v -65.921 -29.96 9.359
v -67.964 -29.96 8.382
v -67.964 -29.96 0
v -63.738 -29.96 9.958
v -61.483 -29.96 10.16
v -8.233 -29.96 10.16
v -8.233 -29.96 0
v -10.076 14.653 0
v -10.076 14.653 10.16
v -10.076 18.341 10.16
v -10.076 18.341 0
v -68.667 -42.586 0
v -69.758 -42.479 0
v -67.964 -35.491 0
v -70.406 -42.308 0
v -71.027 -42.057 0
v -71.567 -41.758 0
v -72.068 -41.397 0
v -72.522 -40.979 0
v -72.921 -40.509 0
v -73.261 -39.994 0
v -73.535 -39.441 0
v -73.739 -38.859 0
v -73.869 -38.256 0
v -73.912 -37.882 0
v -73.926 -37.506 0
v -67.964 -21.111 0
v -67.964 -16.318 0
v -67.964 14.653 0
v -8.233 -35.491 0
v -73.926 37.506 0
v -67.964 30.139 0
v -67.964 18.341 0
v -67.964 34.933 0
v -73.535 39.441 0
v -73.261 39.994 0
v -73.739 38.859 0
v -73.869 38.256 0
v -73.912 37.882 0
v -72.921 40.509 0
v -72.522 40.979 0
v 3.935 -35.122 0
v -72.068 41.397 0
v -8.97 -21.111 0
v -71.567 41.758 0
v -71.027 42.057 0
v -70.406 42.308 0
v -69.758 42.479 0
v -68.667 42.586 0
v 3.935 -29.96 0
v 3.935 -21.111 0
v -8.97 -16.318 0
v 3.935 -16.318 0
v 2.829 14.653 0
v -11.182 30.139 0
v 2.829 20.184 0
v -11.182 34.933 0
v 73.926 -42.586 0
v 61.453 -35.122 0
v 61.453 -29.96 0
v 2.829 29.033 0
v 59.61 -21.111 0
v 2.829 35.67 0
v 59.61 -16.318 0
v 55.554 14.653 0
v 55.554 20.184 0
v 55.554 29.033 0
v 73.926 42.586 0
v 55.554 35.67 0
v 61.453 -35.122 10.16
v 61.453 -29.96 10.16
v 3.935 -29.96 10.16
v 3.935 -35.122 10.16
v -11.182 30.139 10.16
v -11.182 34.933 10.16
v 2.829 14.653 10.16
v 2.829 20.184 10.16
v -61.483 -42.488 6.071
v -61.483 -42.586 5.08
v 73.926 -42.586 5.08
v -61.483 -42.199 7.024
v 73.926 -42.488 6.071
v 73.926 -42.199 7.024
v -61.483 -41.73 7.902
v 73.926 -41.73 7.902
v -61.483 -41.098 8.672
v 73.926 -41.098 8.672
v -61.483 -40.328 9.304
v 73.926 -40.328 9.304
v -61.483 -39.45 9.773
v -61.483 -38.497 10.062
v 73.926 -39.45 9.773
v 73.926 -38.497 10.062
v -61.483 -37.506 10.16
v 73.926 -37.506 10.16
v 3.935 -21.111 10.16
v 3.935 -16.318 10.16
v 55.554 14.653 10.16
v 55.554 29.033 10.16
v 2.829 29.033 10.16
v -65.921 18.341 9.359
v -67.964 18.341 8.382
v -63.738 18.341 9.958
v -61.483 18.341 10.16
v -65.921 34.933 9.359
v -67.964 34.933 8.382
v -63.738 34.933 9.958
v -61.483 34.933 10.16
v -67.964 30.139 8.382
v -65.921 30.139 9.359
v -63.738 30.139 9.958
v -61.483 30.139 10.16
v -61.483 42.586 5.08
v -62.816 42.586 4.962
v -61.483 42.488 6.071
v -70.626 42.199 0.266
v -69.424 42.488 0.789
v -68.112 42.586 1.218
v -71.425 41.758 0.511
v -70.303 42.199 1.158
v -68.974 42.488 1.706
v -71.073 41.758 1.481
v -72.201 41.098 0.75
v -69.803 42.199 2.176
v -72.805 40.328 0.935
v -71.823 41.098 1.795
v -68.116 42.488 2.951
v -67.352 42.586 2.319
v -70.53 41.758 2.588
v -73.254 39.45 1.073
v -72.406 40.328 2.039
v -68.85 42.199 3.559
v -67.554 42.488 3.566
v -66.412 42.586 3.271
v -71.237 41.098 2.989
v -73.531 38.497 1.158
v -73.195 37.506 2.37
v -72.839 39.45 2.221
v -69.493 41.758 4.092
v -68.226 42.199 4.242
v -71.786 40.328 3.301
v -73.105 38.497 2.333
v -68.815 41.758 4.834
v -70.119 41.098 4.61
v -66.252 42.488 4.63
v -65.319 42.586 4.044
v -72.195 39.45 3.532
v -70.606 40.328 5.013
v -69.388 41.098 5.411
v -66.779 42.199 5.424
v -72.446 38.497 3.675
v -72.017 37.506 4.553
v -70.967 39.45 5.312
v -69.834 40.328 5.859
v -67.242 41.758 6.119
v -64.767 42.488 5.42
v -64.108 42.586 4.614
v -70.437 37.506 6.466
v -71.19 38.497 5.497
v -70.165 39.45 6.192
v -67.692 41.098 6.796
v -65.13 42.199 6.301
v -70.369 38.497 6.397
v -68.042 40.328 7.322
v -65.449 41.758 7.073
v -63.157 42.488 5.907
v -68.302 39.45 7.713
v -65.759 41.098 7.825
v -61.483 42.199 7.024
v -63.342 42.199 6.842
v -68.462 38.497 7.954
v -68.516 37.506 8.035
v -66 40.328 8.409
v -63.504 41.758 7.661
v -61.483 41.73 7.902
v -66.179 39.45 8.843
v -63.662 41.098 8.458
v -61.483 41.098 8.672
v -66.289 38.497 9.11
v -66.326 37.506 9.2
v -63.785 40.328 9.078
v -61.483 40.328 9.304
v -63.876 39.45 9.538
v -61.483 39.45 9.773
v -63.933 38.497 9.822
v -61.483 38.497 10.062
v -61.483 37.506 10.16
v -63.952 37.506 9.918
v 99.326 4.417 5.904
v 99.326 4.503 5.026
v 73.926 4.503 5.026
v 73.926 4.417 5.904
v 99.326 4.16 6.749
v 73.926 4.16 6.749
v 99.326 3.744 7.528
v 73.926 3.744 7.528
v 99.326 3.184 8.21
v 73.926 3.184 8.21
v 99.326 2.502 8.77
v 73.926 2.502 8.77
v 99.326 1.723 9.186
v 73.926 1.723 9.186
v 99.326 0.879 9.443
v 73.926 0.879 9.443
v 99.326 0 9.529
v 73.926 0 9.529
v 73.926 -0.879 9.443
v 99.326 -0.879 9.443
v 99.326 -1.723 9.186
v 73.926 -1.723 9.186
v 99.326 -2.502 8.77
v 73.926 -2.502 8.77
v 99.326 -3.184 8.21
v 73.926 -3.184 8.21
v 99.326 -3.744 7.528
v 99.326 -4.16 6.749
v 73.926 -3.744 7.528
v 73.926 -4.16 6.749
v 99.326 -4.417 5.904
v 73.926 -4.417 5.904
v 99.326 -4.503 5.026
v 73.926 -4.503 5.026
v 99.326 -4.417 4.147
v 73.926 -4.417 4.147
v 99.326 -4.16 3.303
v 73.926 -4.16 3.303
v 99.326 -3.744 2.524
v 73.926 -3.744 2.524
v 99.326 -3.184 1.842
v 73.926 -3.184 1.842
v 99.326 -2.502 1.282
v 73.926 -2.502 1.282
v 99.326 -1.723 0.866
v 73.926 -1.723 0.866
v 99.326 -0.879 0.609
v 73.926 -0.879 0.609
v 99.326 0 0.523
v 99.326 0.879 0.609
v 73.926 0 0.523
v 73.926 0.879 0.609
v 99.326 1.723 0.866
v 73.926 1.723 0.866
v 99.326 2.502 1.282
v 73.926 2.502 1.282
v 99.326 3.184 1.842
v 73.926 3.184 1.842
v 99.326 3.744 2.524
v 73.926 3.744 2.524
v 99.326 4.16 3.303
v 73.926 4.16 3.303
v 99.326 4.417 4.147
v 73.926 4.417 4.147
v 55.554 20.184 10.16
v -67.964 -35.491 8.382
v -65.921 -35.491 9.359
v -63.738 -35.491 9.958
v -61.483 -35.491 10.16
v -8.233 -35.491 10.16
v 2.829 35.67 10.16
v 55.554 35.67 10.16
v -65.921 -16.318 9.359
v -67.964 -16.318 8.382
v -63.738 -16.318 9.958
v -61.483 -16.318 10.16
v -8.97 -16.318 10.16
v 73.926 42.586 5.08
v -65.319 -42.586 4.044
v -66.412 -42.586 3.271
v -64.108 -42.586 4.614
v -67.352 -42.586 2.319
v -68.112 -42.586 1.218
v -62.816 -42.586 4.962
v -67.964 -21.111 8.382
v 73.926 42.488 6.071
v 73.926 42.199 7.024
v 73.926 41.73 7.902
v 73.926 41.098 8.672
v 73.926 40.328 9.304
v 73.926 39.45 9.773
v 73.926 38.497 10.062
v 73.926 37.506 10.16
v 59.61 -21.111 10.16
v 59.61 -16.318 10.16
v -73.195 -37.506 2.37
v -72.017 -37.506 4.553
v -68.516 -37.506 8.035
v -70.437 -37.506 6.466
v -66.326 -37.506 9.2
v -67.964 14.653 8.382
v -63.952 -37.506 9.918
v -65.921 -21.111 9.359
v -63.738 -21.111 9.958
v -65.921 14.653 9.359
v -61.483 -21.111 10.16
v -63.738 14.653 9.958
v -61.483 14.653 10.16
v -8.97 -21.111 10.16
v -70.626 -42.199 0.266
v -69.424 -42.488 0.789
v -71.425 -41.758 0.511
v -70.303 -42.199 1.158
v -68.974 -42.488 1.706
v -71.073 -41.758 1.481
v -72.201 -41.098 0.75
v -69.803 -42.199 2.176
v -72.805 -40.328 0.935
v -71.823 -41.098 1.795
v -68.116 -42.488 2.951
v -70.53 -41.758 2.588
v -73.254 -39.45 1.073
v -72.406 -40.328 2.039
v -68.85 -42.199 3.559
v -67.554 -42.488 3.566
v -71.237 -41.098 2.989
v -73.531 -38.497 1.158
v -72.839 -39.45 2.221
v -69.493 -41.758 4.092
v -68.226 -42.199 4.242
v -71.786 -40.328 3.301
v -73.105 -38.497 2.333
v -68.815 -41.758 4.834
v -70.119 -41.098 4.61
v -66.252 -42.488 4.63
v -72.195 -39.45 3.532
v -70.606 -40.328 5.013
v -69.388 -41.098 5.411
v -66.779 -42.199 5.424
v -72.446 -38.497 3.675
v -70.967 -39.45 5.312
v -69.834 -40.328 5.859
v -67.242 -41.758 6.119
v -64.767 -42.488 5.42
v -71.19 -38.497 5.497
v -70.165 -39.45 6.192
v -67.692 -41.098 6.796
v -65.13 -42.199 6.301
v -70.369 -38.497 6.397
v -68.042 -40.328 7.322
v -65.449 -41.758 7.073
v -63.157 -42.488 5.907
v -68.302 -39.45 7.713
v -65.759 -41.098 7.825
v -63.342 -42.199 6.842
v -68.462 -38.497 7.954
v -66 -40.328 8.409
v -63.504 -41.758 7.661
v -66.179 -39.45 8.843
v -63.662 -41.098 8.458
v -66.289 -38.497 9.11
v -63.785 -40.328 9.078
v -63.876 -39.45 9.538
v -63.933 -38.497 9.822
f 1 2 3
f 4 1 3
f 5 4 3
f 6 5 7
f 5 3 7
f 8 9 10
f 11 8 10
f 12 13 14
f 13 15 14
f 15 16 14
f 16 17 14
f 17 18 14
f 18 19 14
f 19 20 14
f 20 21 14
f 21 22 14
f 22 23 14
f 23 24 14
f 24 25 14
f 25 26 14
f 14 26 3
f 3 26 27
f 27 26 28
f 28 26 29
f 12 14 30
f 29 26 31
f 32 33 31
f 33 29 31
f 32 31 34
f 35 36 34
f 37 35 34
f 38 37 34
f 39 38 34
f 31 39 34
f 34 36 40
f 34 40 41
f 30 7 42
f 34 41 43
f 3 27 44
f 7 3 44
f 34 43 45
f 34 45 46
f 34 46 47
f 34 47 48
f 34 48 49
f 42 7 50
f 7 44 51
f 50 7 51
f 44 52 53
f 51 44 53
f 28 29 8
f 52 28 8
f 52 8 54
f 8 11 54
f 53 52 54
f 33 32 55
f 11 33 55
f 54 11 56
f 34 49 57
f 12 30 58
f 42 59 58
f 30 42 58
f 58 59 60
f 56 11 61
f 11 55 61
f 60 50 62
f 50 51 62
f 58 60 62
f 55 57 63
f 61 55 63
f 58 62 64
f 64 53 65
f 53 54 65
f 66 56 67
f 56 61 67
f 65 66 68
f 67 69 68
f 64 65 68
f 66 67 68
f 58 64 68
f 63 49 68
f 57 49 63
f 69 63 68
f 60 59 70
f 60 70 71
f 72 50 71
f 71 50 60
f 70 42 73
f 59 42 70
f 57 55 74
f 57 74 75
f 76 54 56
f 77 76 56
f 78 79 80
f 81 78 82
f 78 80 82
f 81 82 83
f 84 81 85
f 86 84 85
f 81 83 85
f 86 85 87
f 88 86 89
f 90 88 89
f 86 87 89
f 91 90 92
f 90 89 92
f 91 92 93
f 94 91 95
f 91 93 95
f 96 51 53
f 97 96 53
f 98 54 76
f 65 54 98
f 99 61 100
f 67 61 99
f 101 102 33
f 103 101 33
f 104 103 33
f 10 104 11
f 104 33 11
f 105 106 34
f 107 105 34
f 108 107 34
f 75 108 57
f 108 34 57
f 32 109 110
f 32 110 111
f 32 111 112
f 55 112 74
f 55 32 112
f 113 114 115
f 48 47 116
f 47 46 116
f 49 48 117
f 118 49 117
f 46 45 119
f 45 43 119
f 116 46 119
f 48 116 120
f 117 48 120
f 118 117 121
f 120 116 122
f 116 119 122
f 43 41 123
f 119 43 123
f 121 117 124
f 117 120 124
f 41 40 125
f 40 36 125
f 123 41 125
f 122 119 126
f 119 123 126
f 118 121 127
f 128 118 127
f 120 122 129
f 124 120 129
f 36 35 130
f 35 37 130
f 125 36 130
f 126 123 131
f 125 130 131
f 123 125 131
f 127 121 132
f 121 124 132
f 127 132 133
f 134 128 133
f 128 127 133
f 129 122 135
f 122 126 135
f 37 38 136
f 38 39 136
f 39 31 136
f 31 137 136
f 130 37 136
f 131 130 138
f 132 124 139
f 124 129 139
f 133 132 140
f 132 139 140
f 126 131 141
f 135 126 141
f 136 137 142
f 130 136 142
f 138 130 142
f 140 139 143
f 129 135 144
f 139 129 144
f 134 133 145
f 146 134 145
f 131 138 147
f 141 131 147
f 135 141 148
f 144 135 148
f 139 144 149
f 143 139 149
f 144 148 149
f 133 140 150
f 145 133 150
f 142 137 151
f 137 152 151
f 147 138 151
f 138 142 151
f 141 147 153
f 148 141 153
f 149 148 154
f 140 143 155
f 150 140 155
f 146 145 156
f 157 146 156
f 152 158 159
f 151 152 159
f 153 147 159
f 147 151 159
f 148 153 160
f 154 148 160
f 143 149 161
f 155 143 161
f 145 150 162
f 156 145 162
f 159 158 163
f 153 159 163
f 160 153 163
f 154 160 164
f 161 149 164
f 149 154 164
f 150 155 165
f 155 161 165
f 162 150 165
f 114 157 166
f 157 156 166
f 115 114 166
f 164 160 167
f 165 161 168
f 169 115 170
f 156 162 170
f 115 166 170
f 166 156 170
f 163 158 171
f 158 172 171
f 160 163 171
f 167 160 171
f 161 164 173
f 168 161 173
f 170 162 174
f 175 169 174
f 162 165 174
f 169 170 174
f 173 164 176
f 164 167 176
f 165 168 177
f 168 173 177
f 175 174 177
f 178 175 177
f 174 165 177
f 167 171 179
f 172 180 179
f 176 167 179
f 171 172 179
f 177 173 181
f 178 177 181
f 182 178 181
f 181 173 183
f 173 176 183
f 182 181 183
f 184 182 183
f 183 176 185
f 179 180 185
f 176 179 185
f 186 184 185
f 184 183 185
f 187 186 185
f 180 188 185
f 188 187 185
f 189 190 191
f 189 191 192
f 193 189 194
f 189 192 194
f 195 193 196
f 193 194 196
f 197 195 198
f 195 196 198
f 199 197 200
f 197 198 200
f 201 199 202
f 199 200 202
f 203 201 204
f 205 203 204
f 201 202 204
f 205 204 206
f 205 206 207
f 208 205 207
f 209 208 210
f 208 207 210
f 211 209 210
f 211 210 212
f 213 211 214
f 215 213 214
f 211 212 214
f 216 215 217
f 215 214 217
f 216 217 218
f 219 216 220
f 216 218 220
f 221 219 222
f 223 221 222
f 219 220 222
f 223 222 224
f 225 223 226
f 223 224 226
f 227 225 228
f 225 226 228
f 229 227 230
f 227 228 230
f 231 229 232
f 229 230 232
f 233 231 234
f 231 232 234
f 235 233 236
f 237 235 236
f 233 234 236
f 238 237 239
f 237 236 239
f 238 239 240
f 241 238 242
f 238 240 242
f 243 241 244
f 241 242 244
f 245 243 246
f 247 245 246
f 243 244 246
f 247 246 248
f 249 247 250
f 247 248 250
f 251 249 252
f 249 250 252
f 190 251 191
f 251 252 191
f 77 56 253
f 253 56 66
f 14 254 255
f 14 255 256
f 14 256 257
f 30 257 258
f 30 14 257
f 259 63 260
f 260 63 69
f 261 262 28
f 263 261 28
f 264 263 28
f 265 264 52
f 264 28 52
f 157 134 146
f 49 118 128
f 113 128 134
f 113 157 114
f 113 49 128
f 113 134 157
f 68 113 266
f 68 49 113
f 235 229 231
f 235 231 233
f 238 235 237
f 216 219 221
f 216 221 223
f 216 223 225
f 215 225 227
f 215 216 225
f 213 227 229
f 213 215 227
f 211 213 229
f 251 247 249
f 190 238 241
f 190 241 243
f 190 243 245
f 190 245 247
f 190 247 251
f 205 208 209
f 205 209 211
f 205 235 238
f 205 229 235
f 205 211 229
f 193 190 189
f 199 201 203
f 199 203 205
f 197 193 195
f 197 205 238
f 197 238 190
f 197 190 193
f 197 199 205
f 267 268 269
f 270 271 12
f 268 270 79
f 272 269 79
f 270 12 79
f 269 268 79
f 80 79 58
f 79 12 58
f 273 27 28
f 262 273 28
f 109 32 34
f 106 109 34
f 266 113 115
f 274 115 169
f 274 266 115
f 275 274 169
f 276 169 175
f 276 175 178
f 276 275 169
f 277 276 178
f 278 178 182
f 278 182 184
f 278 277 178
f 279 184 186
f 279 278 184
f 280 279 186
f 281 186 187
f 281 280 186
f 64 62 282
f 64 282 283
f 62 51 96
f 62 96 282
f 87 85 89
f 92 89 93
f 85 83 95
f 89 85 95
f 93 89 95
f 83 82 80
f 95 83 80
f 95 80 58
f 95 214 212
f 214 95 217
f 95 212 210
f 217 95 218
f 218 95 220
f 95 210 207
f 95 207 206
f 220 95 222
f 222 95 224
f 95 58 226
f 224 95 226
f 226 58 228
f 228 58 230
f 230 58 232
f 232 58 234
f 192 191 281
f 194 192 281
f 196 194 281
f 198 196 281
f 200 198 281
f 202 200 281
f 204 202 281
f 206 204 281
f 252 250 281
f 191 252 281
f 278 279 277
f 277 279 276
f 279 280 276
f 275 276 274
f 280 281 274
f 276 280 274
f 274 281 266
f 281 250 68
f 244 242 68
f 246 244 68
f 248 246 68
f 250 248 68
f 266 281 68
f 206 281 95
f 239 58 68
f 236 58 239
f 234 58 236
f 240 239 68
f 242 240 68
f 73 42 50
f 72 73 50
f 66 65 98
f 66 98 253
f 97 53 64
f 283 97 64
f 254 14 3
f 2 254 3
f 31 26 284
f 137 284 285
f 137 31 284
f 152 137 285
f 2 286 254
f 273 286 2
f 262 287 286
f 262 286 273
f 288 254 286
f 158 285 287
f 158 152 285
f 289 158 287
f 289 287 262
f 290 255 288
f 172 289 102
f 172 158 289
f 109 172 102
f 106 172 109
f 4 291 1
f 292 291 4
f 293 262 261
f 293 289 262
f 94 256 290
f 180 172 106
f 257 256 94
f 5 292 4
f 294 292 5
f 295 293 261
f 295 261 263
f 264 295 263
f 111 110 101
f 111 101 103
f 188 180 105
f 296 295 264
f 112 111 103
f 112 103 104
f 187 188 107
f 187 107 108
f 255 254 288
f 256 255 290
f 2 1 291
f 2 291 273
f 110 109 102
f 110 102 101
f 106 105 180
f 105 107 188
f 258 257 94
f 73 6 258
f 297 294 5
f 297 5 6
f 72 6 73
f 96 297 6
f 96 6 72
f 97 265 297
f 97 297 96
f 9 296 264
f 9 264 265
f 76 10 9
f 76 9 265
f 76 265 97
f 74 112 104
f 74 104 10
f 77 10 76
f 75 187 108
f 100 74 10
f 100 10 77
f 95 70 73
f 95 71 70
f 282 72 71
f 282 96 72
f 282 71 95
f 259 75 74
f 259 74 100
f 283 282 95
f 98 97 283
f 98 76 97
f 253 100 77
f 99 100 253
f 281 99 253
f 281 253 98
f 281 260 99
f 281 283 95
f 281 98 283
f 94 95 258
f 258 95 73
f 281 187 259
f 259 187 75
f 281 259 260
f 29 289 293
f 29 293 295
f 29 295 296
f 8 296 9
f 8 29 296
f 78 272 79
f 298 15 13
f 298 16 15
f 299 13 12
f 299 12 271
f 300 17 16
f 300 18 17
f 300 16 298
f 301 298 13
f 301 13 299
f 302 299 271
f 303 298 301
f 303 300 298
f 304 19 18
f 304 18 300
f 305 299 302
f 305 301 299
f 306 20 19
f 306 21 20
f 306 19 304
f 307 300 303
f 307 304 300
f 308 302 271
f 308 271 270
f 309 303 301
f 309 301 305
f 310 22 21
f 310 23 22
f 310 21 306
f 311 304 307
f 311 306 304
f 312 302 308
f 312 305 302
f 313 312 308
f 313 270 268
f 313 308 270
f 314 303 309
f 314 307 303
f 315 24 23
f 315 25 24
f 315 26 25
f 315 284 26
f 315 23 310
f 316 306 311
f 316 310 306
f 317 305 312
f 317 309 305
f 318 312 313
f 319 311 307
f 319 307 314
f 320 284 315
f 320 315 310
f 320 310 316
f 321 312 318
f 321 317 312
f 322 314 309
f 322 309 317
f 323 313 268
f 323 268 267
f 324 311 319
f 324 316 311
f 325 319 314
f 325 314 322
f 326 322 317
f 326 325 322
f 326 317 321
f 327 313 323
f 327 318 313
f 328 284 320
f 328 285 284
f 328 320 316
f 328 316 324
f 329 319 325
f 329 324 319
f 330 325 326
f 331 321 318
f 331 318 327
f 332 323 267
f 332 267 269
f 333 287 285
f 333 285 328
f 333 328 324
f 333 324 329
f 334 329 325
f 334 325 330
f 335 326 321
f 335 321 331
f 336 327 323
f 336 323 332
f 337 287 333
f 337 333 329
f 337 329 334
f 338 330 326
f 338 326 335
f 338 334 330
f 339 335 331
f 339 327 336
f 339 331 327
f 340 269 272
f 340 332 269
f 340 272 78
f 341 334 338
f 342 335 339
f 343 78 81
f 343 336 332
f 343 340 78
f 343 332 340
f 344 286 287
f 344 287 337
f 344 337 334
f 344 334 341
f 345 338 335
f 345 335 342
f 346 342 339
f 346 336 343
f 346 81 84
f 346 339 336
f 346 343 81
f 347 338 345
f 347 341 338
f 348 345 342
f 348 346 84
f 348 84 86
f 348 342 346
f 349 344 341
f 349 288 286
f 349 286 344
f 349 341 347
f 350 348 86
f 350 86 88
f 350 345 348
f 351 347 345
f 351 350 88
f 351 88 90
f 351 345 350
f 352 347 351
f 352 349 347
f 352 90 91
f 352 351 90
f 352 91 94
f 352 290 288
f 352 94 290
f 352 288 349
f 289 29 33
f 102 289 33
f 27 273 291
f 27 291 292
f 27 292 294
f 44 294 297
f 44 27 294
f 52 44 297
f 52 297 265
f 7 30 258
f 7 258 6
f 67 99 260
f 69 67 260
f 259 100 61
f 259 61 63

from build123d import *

# Parameters (mm, degrees)
F0_W        = 147.8525847197
F0_H        = 85.1719379425
F0_W_2      = 59.7309665754
F0_H_2      = 5.5306423455
F0_W_3      = 58.9935472235
F0_H_3      = 4.7932267189
F0_W_4      = 57.5187108479
F0_H_4      = 5.1619354635
F0_W_5      = 55.6751615368
F0_W_6      = 57.8874191269
F0_H_5      = 3.6870967597
F0_W_7      = 56.7812863737
F0_H_6      = 4.7932248563
F0_W_8      = 52.7254838962
F0_H_7      = 5.5306442082
F0_H_8      = 6.6367760301
F1_DEPTH    = 10.16
F2_T1_DEPTH = 147.3889774092
F3_R        = 5.08
F4_R        = 4.5031383634
F5_DEPTH    = 25.4


# Not quite as in the source:
# - a fillet or chamfer that OpenCascade refuses, or shapes differently, is made with other operations: its cross-section is extruded or revolved along the edge and cut away or added


with BuildPart() as f1:
    # F0 (on Top) → F1 (new body)
    with BuildSketch(Plane.XY):
        Rectangle(F0_W, F0_H)
        with Locations((-38.0981913768, -32.7256983146)):
            Rectangle(F0_W_2, F0_H_2, mode=Mode.SUBTRACT)
        with Locations((-38.4669010527, -18.7147296965)):
            Rectangle(F0_W_3, F0_H_3, mode=Mode.SUBTRACT)
        with Locations((32.6940652449, -32.5413448736)):
            Rectangle(F0_W_4, F0_H_4, mode=Mode.SUBTRACT)
        with Locations((31.7722905893, -18.7147296965)):
            Rectangle(F0_W_5, F0_H_3, mode=Mode.SUBTRACT)
        with Locations((-39.019965101, 16.4970448241)):
            Rectangle(F0_W_6, F0_H_5, mode=Mode.SUBTRACT)
        with Locations((-39.5730314776, 32.535915263)):
            Rectangle(F0_W_7, F0_H_6, mode=Mode.SUBTRACT)
        with Locations((29.1913239053, 17.4188185483)):
            Rectangle(F0_W_8, F0_H_7, mode=Mode.SUBTRACT)
        with Locations((29.1913239053, 32.3515608907)):
            Rectangle(F0_W_8, F0_H_8, mode=Mode.SUBTRACT)
    extrude(amount=F1_DEPTH)

    # F2: fillet of radius 12.7 on 1 edges, made by hand

    # F2_s2 → F2_t1 (cut)
    with BuildSketch(Plane.XZ.offset(-73.6944887046)):
        with BuildLine():
            ThreePointArc((-73.9262923598, 0), (-69.5150697233, 7.2973776994), (-61.4828844665, 10.16))
            Line((-61.4828844665, 10.16), (-73.9262923598, 10.16))
            Line((-73.9262923598, 10.16), (-73.9262923598, 0))
        make_face()
    extrude(amount=F2_T1_DEPTH, mode=Mode.SUBTRACT)

    # F3
    f3_edges = [f1.edges().sort_by_distance(p)[0] for p in [
        (6.221704, -42.585969, 10.16),
        (6.221704, 42.585969, 10.16),
        (-69.51507, 42.585969, 7.297378),
        (-69.51507, -42.585969, 7.297378),
    ]]
    fillet(f3_edges, radius=F3_R)

    # F4 (on face) → F5 (join)
    with BuildSketch(Plane.YZ.offset(73.9262923598)):
        with Locations((0, 5.0259334967)):
            Circle(F4_R)
    extrude(amount=F5_DEPTH)


solid = f1.part
